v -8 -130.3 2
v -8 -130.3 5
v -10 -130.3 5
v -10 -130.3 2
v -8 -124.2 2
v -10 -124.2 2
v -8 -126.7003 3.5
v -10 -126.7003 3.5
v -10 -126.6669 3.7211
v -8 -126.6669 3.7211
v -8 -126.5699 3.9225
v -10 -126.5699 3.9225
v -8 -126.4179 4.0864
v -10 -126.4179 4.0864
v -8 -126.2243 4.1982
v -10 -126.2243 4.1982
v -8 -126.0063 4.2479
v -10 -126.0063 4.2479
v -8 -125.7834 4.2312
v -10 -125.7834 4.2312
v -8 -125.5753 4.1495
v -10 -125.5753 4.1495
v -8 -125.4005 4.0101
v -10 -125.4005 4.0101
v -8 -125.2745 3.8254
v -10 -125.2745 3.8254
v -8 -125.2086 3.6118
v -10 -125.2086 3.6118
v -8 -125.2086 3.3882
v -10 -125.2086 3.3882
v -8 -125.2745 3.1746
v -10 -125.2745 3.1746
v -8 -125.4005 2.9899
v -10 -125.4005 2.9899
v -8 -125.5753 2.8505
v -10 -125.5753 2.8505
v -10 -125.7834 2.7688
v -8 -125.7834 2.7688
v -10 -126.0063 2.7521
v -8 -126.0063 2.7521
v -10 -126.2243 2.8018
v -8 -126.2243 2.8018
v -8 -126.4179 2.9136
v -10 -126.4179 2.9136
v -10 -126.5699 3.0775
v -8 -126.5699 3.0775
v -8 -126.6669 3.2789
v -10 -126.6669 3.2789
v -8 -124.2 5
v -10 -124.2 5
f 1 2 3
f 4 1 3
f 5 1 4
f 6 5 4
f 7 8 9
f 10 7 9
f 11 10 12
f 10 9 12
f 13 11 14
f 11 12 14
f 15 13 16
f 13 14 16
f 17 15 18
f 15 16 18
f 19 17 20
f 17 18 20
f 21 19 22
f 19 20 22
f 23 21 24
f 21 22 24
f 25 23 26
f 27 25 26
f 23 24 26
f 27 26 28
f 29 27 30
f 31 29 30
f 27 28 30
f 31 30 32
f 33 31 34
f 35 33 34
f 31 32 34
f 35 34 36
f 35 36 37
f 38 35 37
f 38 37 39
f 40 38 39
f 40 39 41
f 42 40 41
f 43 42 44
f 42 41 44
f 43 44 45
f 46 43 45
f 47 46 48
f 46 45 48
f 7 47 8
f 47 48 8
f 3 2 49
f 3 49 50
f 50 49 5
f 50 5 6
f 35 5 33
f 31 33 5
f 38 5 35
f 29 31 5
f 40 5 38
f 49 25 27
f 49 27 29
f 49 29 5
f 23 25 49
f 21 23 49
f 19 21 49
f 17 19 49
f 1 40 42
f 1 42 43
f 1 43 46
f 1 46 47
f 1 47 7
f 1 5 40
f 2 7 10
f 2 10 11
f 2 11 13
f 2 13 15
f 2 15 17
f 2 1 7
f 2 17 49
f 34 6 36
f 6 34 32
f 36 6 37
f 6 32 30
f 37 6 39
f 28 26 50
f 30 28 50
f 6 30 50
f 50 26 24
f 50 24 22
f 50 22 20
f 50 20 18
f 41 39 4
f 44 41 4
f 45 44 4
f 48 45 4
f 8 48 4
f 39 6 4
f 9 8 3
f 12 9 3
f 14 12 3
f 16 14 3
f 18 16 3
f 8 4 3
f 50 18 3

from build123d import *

# Parameters (mm, degrees)
SKETCH126_W      = 2
SKETCH126_H      = 3
EXTRUDE048_DEPTH = 6.1
SKETCH128_R      = 0.75
HOLE027_DEPTH    = 2
HOLE027_TIPS_R   = 0.75


with BuildPart() as part:
    # Sketch126 (on Face7 of Extrude043) → Extrude048 (new body)
    with BuildSketch(Plane(origin=(0, -130.299997, 0), x_dir=(-1, 0, 0), z_dir=(0, 1, 0))):
        with Locations((9, 3.5)):
            Rectangle(SKETCH126_W, SKETCH126_H)
    extrude(amount=EXTRUDE048_DEPTH)

    # Sketch128 (on Face4 of Extrude048) → Hole027 (cut)
    with BuildSketch(Plane(origin=(-10, 0, 0), x_dir=(0, -1, 0), z_dir=(-1, 0, 0))):
        with Locations((125.950268, 3.5)):
            Circle(SKETCH128_R)
    extrude(amount=-HOLE027_DEPTH, mode=Mode.SUBTRACT)

    # Hole027 tips → Hole027 tip 1 section 0
    with BuildSketch(Plane(origin=(-8, 0, 0), x_dir=(0, -1, 0), z_dir=(-1, 0, 0)), mode=Mode.PRIVATE) as hole027_tip_1_s0:
        with Locations((125.950268, 3.5)):
            Circle(HOLE027_TIPS_R)
    loft([hole027_tip_1_s0.sketch, Vertex(-7.549355, -125.950268, 3.5)], mode=Mode.SUBTRACT)


solid = part.part
